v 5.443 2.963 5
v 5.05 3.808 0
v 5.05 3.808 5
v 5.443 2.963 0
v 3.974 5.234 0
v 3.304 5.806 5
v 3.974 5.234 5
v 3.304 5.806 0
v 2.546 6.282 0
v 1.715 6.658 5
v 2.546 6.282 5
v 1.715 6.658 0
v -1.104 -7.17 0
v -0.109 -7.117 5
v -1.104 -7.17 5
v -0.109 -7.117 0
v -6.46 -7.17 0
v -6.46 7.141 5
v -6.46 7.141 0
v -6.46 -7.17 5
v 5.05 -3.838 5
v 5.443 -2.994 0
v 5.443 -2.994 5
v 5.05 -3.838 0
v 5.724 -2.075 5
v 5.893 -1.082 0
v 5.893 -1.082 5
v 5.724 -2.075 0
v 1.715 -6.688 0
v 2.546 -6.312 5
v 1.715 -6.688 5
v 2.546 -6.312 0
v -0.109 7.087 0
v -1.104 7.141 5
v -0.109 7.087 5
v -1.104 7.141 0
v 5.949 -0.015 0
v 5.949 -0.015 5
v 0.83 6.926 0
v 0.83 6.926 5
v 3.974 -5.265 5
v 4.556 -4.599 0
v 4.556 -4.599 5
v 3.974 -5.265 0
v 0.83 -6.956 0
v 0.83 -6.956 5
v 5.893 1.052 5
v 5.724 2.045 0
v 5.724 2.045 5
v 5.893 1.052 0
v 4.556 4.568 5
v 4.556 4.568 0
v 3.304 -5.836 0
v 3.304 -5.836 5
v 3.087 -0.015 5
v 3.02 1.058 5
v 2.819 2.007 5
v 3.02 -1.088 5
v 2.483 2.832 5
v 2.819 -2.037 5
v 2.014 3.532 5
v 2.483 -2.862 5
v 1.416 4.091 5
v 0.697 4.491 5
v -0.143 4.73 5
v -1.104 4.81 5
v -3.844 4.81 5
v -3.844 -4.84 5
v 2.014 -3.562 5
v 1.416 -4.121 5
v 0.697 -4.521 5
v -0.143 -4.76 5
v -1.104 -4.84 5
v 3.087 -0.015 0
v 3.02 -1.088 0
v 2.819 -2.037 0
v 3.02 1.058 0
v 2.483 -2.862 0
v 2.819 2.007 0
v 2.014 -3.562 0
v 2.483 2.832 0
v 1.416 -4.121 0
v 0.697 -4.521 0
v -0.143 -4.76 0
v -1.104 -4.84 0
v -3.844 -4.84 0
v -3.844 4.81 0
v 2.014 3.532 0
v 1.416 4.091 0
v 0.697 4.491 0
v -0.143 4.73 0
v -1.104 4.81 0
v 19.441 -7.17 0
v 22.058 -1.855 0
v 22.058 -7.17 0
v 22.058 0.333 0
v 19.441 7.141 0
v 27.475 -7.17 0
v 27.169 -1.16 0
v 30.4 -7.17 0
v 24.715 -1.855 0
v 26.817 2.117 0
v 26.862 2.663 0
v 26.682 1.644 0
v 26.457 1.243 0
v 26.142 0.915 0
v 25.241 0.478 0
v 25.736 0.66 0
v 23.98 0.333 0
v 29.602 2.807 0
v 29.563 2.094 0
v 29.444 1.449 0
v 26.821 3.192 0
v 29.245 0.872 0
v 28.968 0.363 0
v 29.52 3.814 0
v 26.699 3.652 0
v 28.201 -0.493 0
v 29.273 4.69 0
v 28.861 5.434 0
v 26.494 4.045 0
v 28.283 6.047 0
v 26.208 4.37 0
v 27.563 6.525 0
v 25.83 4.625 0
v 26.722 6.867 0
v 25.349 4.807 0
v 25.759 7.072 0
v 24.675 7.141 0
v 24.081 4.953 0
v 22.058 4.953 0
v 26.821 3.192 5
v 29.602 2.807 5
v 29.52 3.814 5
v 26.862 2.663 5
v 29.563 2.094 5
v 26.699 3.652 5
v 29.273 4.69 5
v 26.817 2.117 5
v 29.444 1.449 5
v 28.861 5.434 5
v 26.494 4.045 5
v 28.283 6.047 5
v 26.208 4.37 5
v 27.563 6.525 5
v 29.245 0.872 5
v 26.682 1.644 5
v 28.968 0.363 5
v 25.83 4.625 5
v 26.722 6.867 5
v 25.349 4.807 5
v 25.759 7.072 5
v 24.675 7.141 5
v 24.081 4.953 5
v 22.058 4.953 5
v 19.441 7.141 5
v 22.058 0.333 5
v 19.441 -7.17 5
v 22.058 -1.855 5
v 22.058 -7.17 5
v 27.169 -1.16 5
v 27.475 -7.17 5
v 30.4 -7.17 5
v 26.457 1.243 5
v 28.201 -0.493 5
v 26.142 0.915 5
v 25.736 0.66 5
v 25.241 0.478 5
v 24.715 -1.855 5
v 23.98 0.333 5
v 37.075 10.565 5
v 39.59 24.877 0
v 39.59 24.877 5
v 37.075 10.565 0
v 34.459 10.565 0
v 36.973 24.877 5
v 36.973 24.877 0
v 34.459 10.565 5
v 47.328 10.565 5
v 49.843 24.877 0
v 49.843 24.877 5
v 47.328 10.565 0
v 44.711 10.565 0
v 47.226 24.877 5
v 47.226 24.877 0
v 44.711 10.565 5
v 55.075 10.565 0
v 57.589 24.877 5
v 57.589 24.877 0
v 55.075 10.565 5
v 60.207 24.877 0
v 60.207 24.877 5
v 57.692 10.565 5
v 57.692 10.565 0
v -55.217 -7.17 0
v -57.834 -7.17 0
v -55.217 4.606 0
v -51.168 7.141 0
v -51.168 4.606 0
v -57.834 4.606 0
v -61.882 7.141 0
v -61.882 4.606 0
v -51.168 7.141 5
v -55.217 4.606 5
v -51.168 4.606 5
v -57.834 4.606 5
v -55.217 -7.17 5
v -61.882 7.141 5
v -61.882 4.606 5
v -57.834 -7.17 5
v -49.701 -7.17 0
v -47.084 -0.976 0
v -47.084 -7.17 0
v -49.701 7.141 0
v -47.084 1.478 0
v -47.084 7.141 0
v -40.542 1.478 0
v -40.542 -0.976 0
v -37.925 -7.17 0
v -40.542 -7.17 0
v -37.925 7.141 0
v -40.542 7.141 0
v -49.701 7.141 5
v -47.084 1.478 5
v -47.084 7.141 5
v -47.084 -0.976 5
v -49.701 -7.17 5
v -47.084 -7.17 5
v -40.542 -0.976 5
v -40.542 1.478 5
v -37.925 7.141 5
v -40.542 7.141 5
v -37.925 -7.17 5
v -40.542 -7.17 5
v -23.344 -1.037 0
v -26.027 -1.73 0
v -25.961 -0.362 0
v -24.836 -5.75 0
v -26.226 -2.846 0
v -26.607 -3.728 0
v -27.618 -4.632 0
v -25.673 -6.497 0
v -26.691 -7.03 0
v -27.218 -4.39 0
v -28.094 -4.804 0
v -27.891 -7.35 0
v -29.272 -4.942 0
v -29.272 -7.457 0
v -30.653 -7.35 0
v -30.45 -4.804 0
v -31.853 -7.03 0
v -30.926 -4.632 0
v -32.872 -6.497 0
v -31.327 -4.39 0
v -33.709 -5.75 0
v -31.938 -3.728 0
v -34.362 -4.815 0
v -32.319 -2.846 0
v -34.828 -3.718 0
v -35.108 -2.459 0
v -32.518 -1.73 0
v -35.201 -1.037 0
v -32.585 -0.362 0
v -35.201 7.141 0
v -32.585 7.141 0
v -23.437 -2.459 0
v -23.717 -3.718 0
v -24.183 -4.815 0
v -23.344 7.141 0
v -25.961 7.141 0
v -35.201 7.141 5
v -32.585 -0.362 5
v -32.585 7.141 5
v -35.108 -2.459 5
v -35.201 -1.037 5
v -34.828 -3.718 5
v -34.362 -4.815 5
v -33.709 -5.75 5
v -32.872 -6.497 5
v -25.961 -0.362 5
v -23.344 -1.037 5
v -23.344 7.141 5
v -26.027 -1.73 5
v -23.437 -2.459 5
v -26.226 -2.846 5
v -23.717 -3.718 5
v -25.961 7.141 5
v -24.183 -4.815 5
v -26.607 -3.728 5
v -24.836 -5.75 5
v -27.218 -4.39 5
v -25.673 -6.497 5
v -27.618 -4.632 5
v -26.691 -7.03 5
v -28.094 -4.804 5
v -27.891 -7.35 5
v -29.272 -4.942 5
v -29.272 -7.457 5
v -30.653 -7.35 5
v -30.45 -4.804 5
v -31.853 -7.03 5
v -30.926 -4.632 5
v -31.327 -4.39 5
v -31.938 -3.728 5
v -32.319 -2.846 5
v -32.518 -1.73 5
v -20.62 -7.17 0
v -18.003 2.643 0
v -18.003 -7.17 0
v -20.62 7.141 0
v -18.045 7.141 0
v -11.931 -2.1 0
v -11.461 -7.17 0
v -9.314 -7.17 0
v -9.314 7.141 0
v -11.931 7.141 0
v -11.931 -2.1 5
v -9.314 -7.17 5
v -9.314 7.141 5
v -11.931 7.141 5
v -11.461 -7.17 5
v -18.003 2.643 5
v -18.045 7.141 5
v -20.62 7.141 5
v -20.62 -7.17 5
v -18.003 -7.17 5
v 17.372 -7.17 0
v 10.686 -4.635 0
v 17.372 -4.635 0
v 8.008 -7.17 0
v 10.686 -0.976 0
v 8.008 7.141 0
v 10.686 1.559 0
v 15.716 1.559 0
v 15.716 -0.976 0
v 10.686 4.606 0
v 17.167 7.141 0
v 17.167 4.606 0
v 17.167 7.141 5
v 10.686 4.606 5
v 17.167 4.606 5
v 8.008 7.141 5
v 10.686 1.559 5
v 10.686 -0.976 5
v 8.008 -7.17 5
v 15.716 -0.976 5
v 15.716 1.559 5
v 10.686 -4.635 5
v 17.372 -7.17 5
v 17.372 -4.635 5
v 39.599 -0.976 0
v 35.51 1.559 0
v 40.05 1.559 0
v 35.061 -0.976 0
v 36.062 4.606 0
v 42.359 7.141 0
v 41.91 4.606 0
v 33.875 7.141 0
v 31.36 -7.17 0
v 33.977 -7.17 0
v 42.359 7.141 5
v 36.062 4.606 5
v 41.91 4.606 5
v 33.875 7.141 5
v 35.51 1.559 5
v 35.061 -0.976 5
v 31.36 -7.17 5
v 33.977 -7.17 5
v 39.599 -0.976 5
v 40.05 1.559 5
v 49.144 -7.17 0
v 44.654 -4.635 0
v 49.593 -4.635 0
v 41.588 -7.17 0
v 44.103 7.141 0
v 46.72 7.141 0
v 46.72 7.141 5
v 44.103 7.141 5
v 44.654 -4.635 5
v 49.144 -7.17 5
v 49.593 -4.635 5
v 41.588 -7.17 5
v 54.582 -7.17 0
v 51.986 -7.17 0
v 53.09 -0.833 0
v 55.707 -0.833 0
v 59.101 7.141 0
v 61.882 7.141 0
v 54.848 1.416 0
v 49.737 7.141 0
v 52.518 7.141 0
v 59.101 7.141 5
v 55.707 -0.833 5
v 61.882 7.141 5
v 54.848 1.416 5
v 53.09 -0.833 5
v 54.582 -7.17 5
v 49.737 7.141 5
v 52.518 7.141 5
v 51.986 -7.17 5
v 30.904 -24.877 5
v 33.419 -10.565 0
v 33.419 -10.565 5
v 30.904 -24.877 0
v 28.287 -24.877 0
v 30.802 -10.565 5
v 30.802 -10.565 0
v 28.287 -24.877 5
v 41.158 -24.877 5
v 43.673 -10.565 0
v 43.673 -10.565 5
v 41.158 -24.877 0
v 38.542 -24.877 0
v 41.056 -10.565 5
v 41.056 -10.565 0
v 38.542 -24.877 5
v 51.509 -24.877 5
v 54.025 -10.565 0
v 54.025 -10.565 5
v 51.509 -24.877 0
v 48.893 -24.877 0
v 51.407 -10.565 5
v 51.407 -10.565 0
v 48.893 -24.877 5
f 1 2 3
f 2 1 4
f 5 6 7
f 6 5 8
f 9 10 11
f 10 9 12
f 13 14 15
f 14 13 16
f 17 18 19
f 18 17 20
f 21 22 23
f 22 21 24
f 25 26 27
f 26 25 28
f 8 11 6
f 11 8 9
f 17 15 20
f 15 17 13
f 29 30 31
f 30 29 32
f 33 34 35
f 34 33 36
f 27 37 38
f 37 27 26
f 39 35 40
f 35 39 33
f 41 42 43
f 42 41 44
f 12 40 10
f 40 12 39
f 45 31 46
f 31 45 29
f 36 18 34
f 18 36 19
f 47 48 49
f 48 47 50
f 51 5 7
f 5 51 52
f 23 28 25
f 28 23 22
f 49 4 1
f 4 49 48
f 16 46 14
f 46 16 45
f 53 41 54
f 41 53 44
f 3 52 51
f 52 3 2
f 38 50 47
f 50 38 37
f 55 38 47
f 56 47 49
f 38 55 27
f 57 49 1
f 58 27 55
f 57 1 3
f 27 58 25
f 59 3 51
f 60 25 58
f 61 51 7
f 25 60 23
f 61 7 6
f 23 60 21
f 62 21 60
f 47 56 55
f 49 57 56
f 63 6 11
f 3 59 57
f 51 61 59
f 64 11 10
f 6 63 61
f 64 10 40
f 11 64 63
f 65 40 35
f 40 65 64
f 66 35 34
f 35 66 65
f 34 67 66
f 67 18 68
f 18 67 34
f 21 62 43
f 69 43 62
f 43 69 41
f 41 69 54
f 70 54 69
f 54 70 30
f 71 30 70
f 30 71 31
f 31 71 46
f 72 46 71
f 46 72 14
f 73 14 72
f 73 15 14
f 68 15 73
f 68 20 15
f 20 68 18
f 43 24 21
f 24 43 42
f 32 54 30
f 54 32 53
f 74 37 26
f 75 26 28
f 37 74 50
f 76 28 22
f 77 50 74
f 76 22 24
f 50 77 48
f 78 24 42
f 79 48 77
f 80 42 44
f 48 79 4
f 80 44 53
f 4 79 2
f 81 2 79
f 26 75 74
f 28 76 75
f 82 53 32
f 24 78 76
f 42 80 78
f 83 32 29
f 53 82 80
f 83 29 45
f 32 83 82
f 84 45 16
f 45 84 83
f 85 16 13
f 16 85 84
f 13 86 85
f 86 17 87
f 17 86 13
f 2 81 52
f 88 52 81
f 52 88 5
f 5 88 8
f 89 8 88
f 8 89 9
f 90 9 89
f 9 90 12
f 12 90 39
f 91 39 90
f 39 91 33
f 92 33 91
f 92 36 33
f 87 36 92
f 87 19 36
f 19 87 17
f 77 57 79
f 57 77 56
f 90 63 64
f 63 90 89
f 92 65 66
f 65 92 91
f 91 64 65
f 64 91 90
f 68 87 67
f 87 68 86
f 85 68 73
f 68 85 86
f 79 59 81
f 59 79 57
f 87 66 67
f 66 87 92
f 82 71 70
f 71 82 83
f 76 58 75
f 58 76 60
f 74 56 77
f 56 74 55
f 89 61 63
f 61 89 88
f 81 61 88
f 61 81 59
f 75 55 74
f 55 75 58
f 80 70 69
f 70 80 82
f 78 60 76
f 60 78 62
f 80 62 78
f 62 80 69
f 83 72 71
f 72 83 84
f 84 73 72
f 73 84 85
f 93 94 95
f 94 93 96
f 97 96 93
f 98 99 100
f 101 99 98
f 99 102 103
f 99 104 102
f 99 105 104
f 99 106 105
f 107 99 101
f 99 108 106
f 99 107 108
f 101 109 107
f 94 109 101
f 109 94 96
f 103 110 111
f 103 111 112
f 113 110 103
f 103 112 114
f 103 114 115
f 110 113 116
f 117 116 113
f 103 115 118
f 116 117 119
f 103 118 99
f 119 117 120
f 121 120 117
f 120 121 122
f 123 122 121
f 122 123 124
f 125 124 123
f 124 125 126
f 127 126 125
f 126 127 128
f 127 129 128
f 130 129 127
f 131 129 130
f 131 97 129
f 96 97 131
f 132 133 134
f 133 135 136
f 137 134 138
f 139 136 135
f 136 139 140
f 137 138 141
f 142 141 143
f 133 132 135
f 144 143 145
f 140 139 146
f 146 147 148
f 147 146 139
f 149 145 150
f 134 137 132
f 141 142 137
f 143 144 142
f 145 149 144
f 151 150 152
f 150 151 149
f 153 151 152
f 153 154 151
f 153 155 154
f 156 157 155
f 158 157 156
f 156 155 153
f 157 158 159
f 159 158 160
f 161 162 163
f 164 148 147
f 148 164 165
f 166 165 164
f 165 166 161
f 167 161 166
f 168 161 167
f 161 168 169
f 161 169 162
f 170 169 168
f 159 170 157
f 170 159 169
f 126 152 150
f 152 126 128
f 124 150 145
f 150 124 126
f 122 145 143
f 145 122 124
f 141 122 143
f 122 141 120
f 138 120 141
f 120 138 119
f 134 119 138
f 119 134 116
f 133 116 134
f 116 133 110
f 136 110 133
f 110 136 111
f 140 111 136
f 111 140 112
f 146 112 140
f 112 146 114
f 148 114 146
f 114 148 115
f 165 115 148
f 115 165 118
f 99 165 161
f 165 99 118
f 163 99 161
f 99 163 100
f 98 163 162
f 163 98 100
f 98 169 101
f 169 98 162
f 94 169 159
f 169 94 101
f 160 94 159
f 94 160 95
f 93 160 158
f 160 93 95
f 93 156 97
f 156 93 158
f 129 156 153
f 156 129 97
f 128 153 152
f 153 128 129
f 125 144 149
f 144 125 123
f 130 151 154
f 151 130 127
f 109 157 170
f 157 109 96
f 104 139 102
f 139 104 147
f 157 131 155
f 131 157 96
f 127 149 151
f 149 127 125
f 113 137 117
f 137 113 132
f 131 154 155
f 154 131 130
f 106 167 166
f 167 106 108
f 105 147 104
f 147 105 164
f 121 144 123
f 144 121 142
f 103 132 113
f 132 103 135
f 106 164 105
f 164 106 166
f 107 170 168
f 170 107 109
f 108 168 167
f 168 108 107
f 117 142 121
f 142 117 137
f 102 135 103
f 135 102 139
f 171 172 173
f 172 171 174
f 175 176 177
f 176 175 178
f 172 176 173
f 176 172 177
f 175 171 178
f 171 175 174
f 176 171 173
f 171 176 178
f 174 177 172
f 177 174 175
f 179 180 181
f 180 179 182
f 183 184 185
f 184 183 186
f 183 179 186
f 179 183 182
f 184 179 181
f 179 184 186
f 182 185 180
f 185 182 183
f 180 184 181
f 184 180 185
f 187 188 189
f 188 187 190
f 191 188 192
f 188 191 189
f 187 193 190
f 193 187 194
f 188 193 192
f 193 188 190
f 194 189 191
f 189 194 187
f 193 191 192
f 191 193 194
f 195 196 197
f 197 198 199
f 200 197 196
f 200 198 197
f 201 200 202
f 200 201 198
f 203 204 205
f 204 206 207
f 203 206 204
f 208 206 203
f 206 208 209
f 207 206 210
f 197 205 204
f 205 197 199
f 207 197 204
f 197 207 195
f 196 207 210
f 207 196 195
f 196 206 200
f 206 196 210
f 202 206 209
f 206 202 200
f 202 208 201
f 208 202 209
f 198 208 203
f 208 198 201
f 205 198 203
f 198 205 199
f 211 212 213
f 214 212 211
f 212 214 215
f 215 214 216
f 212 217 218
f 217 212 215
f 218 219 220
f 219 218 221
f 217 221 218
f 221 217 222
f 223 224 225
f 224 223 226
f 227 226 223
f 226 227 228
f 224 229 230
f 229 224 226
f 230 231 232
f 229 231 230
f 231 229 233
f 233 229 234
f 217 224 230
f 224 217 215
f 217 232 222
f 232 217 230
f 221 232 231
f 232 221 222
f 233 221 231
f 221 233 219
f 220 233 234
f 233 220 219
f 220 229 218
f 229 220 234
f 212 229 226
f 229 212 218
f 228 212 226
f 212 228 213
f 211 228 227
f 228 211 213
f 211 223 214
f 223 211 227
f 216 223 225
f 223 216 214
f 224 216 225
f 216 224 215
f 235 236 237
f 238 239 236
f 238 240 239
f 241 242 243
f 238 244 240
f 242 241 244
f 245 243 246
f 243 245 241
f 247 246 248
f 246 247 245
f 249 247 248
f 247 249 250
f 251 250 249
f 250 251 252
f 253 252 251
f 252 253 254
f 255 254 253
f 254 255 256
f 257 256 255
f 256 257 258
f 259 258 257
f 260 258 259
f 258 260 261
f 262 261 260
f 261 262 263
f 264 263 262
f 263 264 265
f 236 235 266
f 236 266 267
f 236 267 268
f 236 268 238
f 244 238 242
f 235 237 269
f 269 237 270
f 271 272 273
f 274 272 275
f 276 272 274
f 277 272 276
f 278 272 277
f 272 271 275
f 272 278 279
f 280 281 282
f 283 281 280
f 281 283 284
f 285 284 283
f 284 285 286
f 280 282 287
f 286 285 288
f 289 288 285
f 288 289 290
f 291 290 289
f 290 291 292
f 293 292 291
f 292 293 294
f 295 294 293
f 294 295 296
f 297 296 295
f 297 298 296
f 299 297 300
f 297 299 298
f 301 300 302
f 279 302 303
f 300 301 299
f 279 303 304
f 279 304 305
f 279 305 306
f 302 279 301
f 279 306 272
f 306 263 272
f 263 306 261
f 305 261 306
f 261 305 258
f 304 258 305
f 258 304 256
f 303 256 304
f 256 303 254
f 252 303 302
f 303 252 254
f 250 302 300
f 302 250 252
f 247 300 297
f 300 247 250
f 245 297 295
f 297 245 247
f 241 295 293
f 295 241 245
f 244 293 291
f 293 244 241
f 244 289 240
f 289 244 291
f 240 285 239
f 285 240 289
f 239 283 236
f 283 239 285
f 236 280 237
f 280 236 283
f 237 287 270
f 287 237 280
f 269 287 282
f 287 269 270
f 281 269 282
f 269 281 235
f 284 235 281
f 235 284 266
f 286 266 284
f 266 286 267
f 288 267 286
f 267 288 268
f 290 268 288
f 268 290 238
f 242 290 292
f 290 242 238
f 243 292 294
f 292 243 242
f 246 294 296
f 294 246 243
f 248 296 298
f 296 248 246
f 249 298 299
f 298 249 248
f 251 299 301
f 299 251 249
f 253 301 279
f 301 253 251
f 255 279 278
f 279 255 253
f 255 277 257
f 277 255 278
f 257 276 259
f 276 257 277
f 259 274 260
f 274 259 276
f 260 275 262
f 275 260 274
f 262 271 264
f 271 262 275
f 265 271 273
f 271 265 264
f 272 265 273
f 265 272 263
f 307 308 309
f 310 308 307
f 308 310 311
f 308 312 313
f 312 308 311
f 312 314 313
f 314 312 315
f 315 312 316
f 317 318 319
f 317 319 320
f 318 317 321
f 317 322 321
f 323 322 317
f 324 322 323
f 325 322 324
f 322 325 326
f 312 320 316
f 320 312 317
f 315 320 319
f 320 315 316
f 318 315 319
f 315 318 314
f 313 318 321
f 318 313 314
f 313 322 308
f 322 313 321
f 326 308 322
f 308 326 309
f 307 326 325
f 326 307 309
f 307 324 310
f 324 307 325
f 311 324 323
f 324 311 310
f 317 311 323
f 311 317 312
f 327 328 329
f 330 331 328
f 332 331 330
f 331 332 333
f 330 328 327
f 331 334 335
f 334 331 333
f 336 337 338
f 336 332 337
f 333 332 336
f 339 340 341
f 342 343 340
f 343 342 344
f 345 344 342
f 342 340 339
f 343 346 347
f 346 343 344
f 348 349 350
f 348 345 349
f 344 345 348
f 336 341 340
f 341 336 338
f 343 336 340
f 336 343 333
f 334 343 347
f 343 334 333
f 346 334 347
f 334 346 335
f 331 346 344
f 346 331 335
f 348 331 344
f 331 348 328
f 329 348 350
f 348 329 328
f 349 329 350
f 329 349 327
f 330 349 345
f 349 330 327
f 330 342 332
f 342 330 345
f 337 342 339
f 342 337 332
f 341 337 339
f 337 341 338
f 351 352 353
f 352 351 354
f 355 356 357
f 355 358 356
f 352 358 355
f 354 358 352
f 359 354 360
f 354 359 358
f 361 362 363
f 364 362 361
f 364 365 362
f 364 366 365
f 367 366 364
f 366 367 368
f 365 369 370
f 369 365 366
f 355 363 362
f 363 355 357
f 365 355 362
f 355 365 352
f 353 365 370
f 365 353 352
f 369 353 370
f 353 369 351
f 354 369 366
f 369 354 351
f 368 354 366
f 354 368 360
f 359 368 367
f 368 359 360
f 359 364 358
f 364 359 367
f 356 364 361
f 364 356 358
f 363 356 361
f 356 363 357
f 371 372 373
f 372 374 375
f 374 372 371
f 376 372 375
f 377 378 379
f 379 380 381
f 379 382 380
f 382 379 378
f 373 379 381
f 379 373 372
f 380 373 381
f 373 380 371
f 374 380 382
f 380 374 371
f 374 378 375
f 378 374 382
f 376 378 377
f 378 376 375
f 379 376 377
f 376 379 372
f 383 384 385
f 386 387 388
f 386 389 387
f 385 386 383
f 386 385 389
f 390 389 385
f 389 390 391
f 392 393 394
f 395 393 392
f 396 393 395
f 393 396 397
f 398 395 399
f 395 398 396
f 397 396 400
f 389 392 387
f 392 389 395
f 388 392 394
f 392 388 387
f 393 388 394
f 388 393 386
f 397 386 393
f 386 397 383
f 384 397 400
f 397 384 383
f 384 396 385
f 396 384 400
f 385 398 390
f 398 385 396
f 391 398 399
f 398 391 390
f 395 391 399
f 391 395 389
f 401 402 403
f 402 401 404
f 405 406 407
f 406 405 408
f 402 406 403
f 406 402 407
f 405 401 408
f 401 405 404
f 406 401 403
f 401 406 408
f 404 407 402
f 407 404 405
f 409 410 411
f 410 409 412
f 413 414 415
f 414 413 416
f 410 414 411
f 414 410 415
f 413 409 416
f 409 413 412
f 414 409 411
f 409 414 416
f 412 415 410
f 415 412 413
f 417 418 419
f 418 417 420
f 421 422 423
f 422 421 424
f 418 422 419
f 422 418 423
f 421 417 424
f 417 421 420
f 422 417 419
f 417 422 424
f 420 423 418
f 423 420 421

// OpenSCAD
// Module names are of the form poly_<inkscape-path-id>().  As a result,
// you can associate a polygon in this OpenSCAD program with the corresponding
// SVG element in the Inkscape document by looking for the XML element with
// the attribute id="inkscape-path-id".

// fudge value is used to ensure that subtracted solids are a tad taller
// in the z dimension than the polygon being subtracted from.  This helps
// keep the resulting .stl file manifold.
fudge = 0.1;

module poly_path14(h)
{
  scale([25.4/90, -25.4/90, 1]) union()
  {
    linear_extrude(height=h)
      polygon([[131.005856,-88.147459],[122.097656,-37.436522],[131.369136,-37.436522],[140.279296,-88.147459],[131.005856,-88.147459]]);
    linear_extrude(height=h)
      polygon([[167.335936,-88.147459],[158.423826,-37.436522],[167.697266,-37.436522],[176.607426,-88.147459],[167.335936,-88.147459]]);
    linear_extrude(height=h)
      polygon([[204.056636,-88.147459],[195.146486,-37.436522],[204.419926,-37.436522],[213.332026,-88.147459],[204.056636,-88.147459]]);
    linear_extrude(height=h)
      polygon([[-219.265626,-25.301756],[-219.265626,-16.319334],[-204.921876,-16.319334],[-204.921876,25.407229],[-195.650392,25.407229],[-195.650392,-16.319334],[-181.304688,-16.319334],[-181.304688,-25.301756],[-219.265626,-25.301756]]);
    linear_extrude(height=h)
      polygon([[-176.105470,-25.301756],[-176.105470,25.407229],[-166.833985,25.407229],[-166.833985,3.458009],[-143.652344,3.458009],[-143.652344,25.407229],[-134.378904,25.407229],[-134.378904,-25.301756],[-143.652344,-25.301756],[-143.652344,-5.235351],[-166.833985,-5.235351],[-166.833985,-25.301756],[-176.105470,-25.301756]]);
    linear_extrude(height=h)
      polygon([[-124.728514,-25.301756],[-124.728514,3.674809],[-124.398172,8.711791],[-123.407010,13.174165],[-121.754823,17.061666],[-119.441404,20.374029],[-116.475793,23.019739],[-112.866682,24.909363],[-108.614269,26.043038],[-103.718754,26.420899],[-98.825949,26.043038],[-94.575379,24.909363],[-90.966809,23.019739],[-88.000004,20.374029],[-85.688071,17.061666],[-84.036423,13.174165],[-83.045275,8.711791],[-82.714844,3.674809],[-82.714844,-25.301756],[-91.986334,-25.301756],[-91.986334,1.284179],[-92.221534,6.129124],[-92.927734,10.084959],[-94.276573,13.210014],[-96.441404,15.555669],[-97.860305,16.410877],[-99.546582,17.021852],[-103.718754,17.510739],[-107.894875,17.021852],[-109.581243,16.410877],[-111.000004,15.555669],[-113.165964,13.210014],[-114.515624,10.084959],[-115.221679,6.129124],[-115.457034,1.284179],[-115.457034,-25.301756],[-124.728514,-25.301756]]);
    linear_extrude(height=h)
      polygon([[-73.062504,-25.301756],[-73.062504,25.407229],[-63.791014,25.407229],[-63.791014,-9.364261],[-40.609374,25.407229],[-33.003904,25.407229],[-33.003904,-25.301756],[-42.275394,-25.301756],[-42.275394,7.442389],[-63.937504,-25.301756],[-73.062504,-25.301756]]);
    difference()
    {
       linear_extrude(height=h)
         polygon([[-22.890624,-25.301756],[-22.890624,25.407229],[-3.912114,25.407229],[-0.387604,25.217502],[2.942210,24.647872],[6.077772,23.697665],[9.019526,22.366209],[11.706254,20.677683],[14.080554,18.654102],[16.142601,16.295169],[17.892576,13.600589],[19.287247,10.607888],[20.283325,7.352149],[20.880904,3.833910],[21.080076,0.053709],[20.880904,-3.726901],[20.283325,-7.244726],[19.287247,-10.500051],[17.892576,-13.493161],[16.142601,-16.186583],[14.080554,-18.546051],[11.706254,-20.570969],[9.019526,-22.260740],[6.077772,-23.591461],[2.942210,-24.541748],[-0.387604,-25.111785],[-3.912114,-25.301756],[-22.890624,-25.301756]]);
       translate([0, 0, -fudge])
         linear_extrude(height=h+2*fudge)
           polygon([[-13.619144,-17.043943],[-3.912114,-17.043943],[-0.505286,-16.760764],[2.471329,-15.911521],[5.017942,-14.496654],[7.134766,-12.516601],[8.798563,-10.033097],[9.987612,-7.109996],[10.701411,-3.747620],[10.939456,0.053709],[10.701411,3.854493],[9.987612,7.216593],[8.798563,10.139341],[7.134766,12.622069],[5.017942,14.603644],[2.471329,16.018345],[-0.505286,16.866746],[-3.912114,17.149419],[-13.619144,17.149419],[-13.619144,-17.043943]]);
    }
    linear_extrude(height=h)
      polygon([[28.374996,-25.301756],[28.374996,25.407229],[61.554686,25.407229],[61.554686,16.424809],[37.865236,16.424809],[37.865236,3.458009],[55.685546,3.458009],[55.685546,-5.524411],[37.865236,-5.524411],[37.865236,-16.319334],[60.828126,-16.319334],[60.828126,-25.301756],[28.374996,-25.301756]]);
    difference()
    {
       linear_extrude(height=h)
         polygon([[68.884766,-25.301756],[68.884766,25.407229],[78.158206,25.407229],[78.158206,6.573239],[87.212886,6.573239],[87.574216,6.573239],[97.353516,25.407229],[107.714846,25.407229],[96.269526,4.110349],[99.926050,1.747262],[102.642576,-1.286131],[103.624959,-3.090474],[104.327601,-5.134931],[104.749743,-7.419538],[104.890626,-9.944331],[104.598528,-13.513936],[103.722211,-16.617745],[102.261645,-19.255453],[100.216796,-21.426756],[97.665122,-23.121787],[94.682741,-24.332756],[91.270611,-25.059475],[87.429686,-25.301756],[68.884766,-25.301756]]);
       translate([0, 0, -fudge])
         linear_extrude(height=h+2*fudge)
           polygon([[78.158206,-17.549803],[85.328126,-17.549803],[89.820201,-17.033776],[91.522972,-16.388646],[92.863276,-15.485350],[93.876895,-14.332807],[94.601456,-12.940636],[95.036517,-11.308614],[95.181636,-9.436521],[95.022061,-7.501251],[94.543318,-5.823956],[93.745379,-4.404654],[92.628217,-3.243365],[91.191806,-2.340107],[89.436116,-1.694900],[84.966796,-1.178711],[78.158206,-1.178711],[78.158206,-17.549803]]);
    }
    linear_extrude(height=h)
      polygon([[120.029296,-25.301756],[111.117186,25.407229],[120.390626,25.407229],[124.230466,3.458009],[140.312496,3.458009],[141.908206,-5.524411],[125.824216,-5.524411],[127.779296,-16.319334],[148.499996,-16.319334],[150.091796,-25.301756],[120.029296,-25.301756]]);
    linear_extrude(height=h)
      polygon([[156.269526,-25.301756],[147.357426,25.407229],[174.130856,25.407229],[175.724606,16.424809],[158.222656,16.424809],[165.542966,-25.301756],[156.269526,-25.301756]]);
    linear_extrude(height=h)
      polygon([[176.234376,-25.301756],[188.115236,2.952149],[184.203126,25.407229],[193.402346,25.407229],[197.388666,2.952149],[219.265626,-25.301756],[209.414066,-25.301756],[194.343746,-5.018551],[186.087886,-25.301756],[176.234376,-25.301756]]);
    linear_extrude(height=h)
      polygon([[109.140626,37.436529],[100.230466,88.147459],[109.501956,88.147459],[118.412106,37.436529],[109.140626,37.436529]]);
    linear_extrude(height=h)
      polygon([[145.474606,37.436529],[136.564456,88.147459],[145.835936,88.147459],[154.748046,37.436529],[145.474606,37.436529]]);
    linear_extrude(height=h)
      polygon([[182.152346,37.436529],[173.242186,88.147459],[182.513666,88.147459],[191.425776,37.436529],[182.152346,37.436529]]);
  }
}

poly_path14(5);
